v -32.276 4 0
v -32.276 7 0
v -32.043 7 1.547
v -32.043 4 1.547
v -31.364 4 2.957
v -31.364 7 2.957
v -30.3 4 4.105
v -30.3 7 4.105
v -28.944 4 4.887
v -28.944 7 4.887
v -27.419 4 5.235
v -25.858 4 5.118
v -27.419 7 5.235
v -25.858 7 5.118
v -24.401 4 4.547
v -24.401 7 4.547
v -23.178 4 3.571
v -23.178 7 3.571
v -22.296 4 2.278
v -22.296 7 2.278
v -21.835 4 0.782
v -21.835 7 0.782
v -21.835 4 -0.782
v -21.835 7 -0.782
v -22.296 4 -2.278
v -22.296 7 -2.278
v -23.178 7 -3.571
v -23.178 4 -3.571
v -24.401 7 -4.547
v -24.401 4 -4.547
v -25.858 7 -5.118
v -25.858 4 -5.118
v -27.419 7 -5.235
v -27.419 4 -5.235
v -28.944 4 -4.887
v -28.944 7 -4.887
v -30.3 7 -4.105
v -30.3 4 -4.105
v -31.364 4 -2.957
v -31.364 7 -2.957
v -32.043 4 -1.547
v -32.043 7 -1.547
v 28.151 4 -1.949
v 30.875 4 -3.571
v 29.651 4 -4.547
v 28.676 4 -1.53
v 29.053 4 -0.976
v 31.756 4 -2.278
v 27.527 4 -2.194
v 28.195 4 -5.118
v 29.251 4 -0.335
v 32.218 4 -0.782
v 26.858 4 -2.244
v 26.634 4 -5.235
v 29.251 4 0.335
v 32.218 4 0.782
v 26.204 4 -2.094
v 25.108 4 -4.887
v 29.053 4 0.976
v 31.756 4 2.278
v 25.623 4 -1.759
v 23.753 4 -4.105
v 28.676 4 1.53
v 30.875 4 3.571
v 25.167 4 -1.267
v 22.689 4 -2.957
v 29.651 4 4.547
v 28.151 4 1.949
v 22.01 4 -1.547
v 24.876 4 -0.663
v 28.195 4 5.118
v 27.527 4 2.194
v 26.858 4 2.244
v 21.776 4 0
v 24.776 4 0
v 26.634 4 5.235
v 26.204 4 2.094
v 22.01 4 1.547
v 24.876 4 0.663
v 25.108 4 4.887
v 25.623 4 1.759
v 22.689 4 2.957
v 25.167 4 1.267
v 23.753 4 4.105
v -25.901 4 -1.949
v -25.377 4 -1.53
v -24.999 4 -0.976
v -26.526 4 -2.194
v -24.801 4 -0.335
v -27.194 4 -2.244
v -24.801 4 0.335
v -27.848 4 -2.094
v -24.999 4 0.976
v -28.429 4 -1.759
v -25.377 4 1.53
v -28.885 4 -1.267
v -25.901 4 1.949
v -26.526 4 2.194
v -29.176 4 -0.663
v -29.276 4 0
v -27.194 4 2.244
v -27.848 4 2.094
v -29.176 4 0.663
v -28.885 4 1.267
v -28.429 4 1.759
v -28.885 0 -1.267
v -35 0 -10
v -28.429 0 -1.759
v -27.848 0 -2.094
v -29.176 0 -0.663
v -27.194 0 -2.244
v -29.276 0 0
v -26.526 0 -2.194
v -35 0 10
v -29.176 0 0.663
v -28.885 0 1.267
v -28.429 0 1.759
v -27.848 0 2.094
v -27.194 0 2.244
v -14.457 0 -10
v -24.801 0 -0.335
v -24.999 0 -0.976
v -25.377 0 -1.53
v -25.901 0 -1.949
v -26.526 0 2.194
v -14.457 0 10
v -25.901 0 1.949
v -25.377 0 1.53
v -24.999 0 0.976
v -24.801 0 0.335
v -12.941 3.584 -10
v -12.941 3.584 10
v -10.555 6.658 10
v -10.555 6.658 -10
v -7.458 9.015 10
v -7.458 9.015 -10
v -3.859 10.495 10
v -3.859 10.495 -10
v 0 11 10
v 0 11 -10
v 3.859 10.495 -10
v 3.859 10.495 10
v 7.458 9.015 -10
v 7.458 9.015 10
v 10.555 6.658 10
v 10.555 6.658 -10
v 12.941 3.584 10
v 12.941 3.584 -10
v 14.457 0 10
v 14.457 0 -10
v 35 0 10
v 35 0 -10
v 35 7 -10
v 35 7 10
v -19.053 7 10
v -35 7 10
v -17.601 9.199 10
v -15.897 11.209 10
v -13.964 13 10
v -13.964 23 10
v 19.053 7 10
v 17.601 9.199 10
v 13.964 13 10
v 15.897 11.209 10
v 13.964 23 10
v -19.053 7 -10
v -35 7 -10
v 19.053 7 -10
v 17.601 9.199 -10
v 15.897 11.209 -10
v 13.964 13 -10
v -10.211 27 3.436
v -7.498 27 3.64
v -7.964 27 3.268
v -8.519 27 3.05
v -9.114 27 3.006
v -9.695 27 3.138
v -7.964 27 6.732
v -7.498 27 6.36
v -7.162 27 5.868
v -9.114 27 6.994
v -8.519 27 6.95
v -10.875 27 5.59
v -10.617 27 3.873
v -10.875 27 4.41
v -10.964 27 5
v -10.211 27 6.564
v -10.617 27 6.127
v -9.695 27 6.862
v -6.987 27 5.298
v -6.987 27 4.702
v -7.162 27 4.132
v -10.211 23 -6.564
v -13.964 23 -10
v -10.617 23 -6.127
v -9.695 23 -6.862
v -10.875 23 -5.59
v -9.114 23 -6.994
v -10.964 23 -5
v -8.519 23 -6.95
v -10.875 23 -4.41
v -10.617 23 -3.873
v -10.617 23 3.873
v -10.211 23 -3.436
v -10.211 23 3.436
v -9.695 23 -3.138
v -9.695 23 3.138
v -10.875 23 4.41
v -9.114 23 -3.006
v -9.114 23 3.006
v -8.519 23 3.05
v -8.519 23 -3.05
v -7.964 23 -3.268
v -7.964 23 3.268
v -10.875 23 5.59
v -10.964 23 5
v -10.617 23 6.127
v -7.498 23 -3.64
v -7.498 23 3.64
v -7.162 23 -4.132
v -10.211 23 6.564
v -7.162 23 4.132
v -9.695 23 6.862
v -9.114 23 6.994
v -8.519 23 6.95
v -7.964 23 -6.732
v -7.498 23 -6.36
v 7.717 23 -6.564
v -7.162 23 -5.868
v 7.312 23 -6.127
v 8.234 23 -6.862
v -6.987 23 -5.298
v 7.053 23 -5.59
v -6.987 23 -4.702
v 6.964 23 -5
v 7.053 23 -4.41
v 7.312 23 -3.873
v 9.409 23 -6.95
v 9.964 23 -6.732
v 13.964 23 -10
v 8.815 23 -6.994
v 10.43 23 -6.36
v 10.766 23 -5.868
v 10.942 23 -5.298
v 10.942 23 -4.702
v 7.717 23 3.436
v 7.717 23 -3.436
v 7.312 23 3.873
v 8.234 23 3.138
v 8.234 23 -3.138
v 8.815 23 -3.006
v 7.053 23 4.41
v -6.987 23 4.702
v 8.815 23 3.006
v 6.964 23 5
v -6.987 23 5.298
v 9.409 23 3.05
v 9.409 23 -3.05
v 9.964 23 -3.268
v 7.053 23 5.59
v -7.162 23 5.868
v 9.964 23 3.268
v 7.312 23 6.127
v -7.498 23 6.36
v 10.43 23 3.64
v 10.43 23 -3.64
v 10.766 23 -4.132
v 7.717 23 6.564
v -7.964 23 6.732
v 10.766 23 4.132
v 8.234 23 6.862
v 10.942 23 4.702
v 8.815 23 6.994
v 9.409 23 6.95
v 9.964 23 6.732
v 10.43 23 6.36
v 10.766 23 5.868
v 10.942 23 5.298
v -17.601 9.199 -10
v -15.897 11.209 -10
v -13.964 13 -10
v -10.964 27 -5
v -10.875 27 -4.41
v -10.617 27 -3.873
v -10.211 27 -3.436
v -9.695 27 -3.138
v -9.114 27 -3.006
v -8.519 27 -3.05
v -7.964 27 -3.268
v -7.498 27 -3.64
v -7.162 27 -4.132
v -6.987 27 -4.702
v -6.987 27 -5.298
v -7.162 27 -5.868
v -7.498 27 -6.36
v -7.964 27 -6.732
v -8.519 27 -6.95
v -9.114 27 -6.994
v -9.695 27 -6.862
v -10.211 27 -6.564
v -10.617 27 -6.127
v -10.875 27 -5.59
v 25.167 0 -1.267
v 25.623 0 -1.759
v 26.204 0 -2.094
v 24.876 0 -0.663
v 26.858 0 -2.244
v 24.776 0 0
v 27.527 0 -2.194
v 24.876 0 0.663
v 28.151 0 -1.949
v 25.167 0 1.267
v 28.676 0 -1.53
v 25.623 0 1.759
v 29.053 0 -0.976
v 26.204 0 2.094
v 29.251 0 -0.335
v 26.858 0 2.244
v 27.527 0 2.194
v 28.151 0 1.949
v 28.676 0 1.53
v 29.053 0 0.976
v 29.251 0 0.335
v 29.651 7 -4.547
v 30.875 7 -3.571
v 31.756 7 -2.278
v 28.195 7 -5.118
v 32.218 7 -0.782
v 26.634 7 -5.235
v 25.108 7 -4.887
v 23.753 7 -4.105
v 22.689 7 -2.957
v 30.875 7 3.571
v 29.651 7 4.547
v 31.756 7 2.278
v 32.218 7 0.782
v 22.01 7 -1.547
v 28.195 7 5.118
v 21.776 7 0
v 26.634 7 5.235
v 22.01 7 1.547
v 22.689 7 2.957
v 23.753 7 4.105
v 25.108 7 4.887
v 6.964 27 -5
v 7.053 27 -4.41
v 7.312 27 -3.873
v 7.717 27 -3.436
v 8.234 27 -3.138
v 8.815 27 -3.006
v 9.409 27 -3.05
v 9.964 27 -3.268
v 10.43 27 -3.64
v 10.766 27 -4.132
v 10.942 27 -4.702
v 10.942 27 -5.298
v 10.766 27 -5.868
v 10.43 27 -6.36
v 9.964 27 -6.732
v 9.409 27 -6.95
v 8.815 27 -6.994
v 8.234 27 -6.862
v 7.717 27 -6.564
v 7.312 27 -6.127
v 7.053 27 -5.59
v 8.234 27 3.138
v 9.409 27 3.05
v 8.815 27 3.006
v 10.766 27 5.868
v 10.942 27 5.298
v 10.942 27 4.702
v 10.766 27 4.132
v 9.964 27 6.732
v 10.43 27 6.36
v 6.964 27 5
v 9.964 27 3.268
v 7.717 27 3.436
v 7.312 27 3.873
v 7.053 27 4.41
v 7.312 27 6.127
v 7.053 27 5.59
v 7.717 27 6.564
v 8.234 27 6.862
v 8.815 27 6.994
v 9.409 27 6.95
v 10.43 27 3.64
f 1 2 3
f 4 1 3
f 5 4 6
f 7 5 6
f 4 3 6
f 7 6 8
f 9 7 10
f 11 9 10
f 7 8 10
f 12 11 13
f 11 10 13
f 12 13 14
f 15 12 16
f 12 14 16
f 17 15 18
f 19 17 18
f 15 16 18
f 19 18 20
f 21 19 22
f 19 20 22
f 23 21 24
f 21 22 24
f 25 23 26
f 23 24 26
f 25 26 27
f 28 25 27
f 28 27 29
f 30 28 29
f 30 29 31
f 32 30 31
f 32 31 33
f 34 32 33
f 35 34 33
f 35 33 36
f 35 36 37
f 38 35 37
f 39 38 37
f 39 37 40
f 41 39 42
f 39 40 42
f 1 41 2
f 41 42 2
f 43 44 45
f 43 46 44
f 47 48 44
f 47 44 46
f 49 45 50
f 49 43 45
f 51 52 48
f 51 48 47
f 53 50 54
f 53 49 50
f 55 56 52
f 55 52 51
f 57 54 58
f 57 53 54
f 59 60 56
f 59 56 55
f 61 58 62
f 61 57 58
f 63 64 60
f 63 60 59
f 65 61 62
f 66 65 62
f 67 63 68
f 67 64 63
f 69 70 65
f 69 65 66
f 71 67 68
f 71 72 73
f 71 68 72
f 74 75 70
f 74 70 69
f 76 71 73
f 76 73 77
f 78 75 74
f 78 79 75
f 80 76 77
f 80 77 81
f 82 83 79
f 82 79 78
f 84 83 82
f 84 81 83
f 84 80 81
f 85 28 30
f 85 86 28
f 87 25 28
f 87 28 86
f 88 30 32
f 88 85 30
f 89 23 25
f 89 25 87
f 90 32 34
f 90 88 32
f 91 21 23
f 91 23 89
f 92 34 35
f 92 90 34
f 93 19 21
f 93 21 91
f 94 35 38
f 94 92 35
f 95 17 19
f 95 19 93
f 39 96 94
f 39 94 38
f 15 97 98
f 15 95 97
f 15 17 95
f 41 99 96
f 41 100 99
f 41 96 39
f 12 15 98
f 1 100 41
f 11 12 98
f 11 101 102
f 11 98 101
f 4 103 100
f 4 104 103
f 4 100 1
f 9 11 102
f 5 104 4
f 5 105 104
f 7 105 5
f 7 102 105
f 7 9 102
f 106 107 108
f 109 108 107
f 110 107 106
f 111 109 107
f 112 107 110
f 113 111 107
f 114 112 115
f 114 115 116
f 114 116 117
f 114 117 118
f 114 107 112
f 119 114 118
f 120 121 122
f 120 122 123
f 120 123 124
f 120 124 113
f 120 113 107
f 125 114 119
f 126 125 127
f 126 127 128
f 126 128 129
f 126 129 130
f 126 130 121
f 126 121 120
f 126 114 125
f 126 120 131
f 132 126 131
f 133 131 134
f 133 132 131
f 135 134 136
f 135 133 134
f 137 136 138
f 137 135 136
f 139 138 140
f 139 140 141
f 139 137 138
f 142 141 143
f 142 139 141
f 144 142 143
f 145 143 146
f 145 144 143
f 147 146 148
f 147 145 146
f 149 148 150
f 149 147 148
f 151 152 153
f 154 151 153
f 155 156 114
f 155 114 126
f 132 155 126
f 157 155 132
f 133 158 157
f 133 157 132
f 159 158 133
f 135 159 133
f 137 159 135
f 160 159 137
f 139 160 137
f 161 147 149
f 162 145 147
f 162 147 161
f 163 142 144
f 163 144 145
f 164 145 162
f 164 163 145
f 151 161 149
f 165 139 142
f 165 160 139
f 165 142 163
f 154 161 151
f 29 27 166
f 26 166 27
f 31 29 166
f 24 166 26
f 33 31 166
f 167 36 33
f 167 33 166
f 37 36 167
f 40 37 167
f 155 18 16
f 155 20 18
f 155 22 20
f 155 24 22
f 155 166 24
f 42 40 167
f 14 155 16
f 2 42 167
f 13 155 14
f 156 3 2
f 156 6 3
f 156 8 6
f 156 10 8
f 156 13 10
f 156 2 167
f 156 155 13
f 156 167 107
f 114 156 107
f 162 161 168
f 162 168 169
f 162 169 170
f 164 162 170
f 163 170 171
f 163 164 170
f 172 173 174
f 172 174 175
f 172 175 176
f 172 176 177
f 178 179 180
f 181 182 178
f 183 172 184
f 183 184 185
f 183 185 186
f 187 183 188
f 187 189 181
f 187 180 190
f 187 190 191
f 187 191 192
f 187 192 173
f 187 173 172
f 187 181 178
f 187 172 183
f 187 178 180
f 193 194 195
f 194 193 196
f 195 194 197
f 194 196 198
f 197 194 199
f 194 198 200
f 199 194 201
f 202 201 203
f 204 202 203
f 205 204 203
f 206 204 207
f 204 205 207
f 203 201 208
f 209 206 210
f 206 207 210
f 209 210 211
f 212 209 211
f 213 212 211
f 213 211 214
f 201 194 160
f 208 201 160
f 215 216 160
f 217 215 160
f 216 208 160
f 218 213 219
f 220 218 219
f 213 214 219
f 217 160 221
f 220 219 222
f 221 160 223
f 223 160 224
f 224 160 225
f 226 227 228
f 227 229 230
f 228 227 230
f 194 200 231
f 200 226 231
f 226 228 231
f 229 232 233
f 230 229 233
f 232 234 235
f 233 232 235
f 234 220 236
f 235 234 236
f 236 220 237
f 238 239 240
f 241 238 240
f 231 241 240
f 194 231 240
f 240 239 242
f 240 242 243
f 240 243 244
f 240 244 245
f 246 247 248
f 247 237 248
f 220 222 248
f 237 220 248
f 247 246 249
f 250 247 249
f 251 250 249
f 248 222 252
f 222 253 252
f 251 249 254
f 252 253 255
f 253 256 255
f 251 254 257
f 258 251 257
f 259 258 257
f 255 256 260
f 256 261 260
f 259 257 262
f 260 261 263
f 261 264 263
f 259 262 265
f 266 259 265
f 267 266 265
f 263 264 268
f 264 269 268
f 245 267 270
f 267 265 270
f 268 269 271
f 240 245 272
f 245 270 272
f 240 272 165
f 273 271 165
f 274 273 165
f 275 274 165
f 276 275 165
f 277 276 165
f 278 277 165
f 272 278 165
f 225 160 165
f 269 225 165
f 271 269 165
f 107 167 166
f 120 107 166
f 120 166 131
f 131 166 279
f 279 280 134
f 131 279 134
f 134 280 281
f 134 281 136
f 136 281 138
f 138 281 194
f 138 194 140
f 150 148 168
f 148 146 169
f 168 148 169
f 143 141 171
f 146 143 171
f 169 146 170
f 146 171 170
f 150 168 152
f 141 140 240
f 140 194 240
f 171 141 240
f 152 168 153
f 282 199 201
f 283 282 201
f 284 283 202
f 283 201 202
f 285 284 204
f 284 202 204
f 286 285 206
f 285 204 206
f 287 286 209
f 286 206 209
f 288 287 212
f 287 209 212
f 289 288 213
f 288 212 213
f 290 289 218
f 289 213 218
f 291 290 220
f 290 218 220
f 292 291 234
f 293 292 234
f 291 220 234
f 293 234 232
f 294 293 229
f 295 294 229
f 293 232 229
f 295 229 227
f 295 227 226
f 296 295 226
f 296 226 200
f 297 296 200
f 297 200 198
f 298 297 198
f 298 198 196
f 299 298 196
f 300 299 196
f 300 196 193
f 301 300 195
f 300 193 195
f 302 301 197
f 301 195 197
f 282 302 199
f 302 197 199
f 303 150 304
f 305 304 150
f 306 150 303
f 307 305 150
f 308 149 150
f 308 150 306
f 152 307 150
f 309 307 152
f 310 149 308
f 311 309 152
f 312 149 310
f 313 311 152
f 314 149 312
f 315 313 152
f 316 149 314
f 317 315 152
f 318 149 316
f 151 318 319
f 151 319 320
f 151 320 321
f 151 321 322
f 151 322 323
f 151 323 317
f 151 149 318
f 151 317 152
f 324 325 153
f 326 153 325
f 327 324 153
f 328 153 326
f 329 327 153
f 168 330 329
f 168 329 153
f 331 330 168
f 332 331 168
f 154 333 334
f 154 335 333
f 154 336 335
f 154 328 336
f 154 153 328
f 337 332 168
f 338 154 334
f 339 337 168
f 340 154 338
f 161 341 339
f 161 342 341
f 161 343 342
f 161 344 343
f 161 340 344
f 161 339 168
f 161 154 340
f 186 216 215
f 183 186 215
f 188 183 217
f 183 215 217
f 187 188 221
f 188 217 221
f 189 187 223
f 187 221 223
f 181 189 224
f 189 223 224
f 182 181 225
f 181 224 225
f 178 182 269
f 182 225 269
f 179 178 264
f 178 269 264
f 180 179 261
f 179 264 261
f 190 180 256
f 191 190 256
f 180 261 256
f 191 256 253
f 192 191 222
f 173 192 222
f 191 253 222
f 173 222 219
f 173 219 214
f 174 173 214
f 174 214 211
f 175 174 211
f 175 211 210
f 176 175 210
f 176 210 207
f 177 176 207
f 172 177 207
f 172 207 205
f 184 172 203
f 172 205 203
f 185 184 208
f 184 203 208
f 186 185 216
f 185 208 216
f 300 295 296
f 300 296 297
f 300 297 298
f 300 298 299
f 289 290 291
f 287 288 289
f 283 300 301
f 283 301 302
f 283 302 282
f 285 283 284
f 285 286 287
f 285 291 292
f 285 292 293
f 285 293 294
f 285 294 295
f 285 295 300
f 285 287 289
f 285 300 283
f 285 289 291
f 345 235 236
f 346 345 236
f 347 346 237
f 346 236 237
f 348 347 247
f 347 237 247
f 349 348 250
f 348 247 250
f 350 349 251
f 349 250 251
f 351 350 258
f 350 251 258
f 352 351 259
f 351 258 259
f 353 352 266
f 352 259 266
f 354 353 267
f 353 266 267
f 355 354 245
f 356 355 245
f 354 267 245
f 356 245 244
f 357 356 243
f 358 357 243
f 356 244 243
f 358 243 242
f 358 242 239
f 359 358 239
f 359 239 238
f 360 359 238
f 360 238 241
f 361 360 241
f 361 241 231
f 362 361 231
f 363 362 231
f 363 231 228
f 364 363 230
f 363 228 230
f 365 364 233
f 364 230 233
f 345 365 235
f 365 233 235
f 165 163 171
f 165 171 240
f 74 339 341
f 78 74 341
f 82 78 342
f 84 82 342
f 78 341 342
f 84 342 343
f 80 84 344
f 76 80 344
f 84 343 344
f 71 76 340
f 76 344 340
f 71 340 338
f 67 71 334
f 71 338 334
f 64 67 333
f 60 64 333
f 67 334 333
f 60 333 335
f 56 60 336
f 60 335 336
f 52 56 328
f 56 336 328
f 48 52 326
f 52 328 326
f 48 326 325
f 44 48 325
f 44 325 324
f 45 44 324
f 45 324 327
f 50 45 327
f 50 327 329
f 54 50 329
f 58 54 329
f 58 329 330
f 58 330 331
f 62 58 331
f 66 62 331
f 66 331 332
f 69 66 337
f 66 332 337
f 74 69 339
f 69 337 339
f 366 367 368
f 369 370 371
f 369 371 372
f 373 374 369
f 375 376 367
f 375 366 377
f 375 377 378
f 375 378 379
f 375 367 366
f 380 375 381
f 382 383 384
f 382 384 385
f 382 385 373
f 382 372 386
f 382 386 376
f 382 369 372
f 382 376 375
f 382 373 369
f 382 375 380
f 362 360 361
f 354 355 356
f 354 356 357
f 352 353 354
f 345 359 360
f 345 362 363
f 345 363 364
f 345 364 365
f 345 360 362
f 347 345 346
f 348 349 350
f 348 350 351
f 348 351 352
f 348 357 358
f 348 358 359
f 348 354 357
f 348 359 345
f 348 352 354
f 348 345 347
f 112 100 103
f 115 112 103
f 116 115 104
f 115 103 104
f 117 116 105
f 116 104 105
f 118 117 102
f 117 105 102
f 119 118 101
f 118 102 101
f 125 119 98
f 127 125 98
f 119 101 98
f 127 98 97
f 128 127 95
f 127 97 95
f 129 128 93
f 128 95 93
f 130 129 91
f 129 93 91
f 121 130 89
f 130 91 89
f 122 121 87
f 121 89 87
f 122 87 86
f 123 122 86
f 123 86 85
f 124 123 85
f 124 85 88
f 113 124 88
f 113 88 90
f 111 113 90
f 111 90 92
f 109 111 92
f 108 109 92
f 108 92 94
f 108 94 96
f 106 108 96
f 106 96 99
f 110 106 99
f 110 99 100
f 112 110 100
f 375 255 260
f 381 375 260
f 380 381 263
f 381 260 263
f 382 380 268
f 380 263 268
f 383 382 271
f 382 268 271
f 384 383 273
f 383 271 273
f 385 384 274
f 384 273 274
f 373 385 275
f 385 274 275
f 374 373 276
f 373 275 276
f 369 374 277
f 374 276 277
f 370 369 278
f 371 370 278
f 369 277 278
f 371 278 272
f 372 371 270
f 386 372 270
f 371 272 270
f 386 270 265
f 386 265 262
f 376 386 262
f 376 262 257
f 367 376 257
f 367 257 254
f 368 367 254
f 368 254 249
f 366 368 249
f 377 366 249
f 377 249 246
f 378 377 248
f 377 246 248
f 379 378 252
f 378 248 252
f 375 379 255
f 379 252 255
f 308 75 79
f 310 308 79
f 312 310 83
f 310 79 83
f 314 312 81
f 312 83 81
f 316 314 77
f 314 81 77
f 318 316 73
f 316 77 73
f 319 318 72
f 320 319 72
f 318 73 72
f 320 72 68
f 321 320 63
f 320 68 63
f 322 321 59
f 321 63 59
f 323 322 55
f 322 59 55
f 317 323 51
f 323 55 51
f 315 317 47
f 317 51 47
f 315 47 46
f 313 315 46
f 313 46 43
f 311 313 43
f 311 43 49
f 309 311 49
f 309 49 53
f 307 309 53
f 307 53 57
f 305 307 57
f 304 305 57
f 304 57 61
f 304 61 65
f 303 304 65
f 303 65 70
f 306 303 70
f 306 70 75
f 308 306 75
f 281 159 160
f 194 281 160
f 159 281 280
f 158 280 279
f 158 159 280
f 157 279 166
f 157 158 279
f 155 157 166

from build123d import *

# Parameters (mm, degrees)
F1_DEPTH = 10
F2_R     = 2.25
F3_DEPTH = 25
F4_R     = 5.25
F4_R_2   = 2.25
F5_DEPTH = 3
F6_W     = 27.92848
F6_H     = 10
F7_DEPTH = 20
F8_R     = 2
F9_DEPTH = 4


with BuildPart() as f1:
    # F0 (on Top) → F1 (new body, symmetric)
    with BuildSketch(Plane.XY):
        with BuildLine():
            Line((-35, 7), (-35, 0))
            Line((-35, 0), (-14.456832, 0))
            ThreePointArc((-14.456832, 0), (0, 11), (14.456832, 0))
            Line((14.456832, 0), (35, 0))
            Line((35, 0), (35, 7))
            Line((35, 7), (19.052559, 7))
            ThreePointArc((19.052559, 7), (0, 18), (-19.052559, 7))
            Line((-19.052559, 7), (-35, 7))
        make_face()
    extrude(amount=F1_DEPTH, both=True)

    # F2 (on face) → F3 (cut)
    with BuildSketch(Plane(origin=(0, 7, 0), x_dir=(-1, 0, 0), z_dir=(0, 1, 0))):
        with Locations((-27.026279, 0)):
            Circle(F2_R)
        with Locations((27.026279, 0)):
            Circle(F2_R)
    extrude(amount=-F3_DEPTH, mode=Mode.SUBTRACT)

    # F4 (on face) → F5 (cut)
    with BuildSketch(Plane(origin=(0, 7, 0), x_dir=(-1, 0, 0), z_dir=(0, 1, 0))):
        with Locations((27.026279, 0)):
            Circle(F4_R)
        with Locations((27.026279, 0)):
            Circle(F4_R_2, mode=Mode.SUBTRACT)
        with Locations((-27.026279, 0)):
            Circle(F4_R)
    extrude(amount=-F5_DEPTH, mode=Mode.SUBTRACT)

    # F6 (on face) → F7 (join)
    with BuildSketch(Plane.XY.offset(10)):
        with Locations((0, 18)):
            Rectangle(F6_W, F6_H)
    extrude(amount=-F7_DEPTH)

    # F8 (on face) → F9 (join)
    with BuildSketch(Plane(origin=(0, 23, 0), x_dir=(-1, 0, 0), z_dir=(0, 1, 0))):
        with Locations((8.96424, -5)):
            Circle(F8_R)
        with Locations((-8.96424, -5)):
            Circle(F8_R)
        with Locations((8.96424, 5)):
            Circle(F8_R)
        with Locations((-8.96424, 5)):
            Circle(F8_R)
    extrude(amount=F9_DEPTH)


solid = f1.part
